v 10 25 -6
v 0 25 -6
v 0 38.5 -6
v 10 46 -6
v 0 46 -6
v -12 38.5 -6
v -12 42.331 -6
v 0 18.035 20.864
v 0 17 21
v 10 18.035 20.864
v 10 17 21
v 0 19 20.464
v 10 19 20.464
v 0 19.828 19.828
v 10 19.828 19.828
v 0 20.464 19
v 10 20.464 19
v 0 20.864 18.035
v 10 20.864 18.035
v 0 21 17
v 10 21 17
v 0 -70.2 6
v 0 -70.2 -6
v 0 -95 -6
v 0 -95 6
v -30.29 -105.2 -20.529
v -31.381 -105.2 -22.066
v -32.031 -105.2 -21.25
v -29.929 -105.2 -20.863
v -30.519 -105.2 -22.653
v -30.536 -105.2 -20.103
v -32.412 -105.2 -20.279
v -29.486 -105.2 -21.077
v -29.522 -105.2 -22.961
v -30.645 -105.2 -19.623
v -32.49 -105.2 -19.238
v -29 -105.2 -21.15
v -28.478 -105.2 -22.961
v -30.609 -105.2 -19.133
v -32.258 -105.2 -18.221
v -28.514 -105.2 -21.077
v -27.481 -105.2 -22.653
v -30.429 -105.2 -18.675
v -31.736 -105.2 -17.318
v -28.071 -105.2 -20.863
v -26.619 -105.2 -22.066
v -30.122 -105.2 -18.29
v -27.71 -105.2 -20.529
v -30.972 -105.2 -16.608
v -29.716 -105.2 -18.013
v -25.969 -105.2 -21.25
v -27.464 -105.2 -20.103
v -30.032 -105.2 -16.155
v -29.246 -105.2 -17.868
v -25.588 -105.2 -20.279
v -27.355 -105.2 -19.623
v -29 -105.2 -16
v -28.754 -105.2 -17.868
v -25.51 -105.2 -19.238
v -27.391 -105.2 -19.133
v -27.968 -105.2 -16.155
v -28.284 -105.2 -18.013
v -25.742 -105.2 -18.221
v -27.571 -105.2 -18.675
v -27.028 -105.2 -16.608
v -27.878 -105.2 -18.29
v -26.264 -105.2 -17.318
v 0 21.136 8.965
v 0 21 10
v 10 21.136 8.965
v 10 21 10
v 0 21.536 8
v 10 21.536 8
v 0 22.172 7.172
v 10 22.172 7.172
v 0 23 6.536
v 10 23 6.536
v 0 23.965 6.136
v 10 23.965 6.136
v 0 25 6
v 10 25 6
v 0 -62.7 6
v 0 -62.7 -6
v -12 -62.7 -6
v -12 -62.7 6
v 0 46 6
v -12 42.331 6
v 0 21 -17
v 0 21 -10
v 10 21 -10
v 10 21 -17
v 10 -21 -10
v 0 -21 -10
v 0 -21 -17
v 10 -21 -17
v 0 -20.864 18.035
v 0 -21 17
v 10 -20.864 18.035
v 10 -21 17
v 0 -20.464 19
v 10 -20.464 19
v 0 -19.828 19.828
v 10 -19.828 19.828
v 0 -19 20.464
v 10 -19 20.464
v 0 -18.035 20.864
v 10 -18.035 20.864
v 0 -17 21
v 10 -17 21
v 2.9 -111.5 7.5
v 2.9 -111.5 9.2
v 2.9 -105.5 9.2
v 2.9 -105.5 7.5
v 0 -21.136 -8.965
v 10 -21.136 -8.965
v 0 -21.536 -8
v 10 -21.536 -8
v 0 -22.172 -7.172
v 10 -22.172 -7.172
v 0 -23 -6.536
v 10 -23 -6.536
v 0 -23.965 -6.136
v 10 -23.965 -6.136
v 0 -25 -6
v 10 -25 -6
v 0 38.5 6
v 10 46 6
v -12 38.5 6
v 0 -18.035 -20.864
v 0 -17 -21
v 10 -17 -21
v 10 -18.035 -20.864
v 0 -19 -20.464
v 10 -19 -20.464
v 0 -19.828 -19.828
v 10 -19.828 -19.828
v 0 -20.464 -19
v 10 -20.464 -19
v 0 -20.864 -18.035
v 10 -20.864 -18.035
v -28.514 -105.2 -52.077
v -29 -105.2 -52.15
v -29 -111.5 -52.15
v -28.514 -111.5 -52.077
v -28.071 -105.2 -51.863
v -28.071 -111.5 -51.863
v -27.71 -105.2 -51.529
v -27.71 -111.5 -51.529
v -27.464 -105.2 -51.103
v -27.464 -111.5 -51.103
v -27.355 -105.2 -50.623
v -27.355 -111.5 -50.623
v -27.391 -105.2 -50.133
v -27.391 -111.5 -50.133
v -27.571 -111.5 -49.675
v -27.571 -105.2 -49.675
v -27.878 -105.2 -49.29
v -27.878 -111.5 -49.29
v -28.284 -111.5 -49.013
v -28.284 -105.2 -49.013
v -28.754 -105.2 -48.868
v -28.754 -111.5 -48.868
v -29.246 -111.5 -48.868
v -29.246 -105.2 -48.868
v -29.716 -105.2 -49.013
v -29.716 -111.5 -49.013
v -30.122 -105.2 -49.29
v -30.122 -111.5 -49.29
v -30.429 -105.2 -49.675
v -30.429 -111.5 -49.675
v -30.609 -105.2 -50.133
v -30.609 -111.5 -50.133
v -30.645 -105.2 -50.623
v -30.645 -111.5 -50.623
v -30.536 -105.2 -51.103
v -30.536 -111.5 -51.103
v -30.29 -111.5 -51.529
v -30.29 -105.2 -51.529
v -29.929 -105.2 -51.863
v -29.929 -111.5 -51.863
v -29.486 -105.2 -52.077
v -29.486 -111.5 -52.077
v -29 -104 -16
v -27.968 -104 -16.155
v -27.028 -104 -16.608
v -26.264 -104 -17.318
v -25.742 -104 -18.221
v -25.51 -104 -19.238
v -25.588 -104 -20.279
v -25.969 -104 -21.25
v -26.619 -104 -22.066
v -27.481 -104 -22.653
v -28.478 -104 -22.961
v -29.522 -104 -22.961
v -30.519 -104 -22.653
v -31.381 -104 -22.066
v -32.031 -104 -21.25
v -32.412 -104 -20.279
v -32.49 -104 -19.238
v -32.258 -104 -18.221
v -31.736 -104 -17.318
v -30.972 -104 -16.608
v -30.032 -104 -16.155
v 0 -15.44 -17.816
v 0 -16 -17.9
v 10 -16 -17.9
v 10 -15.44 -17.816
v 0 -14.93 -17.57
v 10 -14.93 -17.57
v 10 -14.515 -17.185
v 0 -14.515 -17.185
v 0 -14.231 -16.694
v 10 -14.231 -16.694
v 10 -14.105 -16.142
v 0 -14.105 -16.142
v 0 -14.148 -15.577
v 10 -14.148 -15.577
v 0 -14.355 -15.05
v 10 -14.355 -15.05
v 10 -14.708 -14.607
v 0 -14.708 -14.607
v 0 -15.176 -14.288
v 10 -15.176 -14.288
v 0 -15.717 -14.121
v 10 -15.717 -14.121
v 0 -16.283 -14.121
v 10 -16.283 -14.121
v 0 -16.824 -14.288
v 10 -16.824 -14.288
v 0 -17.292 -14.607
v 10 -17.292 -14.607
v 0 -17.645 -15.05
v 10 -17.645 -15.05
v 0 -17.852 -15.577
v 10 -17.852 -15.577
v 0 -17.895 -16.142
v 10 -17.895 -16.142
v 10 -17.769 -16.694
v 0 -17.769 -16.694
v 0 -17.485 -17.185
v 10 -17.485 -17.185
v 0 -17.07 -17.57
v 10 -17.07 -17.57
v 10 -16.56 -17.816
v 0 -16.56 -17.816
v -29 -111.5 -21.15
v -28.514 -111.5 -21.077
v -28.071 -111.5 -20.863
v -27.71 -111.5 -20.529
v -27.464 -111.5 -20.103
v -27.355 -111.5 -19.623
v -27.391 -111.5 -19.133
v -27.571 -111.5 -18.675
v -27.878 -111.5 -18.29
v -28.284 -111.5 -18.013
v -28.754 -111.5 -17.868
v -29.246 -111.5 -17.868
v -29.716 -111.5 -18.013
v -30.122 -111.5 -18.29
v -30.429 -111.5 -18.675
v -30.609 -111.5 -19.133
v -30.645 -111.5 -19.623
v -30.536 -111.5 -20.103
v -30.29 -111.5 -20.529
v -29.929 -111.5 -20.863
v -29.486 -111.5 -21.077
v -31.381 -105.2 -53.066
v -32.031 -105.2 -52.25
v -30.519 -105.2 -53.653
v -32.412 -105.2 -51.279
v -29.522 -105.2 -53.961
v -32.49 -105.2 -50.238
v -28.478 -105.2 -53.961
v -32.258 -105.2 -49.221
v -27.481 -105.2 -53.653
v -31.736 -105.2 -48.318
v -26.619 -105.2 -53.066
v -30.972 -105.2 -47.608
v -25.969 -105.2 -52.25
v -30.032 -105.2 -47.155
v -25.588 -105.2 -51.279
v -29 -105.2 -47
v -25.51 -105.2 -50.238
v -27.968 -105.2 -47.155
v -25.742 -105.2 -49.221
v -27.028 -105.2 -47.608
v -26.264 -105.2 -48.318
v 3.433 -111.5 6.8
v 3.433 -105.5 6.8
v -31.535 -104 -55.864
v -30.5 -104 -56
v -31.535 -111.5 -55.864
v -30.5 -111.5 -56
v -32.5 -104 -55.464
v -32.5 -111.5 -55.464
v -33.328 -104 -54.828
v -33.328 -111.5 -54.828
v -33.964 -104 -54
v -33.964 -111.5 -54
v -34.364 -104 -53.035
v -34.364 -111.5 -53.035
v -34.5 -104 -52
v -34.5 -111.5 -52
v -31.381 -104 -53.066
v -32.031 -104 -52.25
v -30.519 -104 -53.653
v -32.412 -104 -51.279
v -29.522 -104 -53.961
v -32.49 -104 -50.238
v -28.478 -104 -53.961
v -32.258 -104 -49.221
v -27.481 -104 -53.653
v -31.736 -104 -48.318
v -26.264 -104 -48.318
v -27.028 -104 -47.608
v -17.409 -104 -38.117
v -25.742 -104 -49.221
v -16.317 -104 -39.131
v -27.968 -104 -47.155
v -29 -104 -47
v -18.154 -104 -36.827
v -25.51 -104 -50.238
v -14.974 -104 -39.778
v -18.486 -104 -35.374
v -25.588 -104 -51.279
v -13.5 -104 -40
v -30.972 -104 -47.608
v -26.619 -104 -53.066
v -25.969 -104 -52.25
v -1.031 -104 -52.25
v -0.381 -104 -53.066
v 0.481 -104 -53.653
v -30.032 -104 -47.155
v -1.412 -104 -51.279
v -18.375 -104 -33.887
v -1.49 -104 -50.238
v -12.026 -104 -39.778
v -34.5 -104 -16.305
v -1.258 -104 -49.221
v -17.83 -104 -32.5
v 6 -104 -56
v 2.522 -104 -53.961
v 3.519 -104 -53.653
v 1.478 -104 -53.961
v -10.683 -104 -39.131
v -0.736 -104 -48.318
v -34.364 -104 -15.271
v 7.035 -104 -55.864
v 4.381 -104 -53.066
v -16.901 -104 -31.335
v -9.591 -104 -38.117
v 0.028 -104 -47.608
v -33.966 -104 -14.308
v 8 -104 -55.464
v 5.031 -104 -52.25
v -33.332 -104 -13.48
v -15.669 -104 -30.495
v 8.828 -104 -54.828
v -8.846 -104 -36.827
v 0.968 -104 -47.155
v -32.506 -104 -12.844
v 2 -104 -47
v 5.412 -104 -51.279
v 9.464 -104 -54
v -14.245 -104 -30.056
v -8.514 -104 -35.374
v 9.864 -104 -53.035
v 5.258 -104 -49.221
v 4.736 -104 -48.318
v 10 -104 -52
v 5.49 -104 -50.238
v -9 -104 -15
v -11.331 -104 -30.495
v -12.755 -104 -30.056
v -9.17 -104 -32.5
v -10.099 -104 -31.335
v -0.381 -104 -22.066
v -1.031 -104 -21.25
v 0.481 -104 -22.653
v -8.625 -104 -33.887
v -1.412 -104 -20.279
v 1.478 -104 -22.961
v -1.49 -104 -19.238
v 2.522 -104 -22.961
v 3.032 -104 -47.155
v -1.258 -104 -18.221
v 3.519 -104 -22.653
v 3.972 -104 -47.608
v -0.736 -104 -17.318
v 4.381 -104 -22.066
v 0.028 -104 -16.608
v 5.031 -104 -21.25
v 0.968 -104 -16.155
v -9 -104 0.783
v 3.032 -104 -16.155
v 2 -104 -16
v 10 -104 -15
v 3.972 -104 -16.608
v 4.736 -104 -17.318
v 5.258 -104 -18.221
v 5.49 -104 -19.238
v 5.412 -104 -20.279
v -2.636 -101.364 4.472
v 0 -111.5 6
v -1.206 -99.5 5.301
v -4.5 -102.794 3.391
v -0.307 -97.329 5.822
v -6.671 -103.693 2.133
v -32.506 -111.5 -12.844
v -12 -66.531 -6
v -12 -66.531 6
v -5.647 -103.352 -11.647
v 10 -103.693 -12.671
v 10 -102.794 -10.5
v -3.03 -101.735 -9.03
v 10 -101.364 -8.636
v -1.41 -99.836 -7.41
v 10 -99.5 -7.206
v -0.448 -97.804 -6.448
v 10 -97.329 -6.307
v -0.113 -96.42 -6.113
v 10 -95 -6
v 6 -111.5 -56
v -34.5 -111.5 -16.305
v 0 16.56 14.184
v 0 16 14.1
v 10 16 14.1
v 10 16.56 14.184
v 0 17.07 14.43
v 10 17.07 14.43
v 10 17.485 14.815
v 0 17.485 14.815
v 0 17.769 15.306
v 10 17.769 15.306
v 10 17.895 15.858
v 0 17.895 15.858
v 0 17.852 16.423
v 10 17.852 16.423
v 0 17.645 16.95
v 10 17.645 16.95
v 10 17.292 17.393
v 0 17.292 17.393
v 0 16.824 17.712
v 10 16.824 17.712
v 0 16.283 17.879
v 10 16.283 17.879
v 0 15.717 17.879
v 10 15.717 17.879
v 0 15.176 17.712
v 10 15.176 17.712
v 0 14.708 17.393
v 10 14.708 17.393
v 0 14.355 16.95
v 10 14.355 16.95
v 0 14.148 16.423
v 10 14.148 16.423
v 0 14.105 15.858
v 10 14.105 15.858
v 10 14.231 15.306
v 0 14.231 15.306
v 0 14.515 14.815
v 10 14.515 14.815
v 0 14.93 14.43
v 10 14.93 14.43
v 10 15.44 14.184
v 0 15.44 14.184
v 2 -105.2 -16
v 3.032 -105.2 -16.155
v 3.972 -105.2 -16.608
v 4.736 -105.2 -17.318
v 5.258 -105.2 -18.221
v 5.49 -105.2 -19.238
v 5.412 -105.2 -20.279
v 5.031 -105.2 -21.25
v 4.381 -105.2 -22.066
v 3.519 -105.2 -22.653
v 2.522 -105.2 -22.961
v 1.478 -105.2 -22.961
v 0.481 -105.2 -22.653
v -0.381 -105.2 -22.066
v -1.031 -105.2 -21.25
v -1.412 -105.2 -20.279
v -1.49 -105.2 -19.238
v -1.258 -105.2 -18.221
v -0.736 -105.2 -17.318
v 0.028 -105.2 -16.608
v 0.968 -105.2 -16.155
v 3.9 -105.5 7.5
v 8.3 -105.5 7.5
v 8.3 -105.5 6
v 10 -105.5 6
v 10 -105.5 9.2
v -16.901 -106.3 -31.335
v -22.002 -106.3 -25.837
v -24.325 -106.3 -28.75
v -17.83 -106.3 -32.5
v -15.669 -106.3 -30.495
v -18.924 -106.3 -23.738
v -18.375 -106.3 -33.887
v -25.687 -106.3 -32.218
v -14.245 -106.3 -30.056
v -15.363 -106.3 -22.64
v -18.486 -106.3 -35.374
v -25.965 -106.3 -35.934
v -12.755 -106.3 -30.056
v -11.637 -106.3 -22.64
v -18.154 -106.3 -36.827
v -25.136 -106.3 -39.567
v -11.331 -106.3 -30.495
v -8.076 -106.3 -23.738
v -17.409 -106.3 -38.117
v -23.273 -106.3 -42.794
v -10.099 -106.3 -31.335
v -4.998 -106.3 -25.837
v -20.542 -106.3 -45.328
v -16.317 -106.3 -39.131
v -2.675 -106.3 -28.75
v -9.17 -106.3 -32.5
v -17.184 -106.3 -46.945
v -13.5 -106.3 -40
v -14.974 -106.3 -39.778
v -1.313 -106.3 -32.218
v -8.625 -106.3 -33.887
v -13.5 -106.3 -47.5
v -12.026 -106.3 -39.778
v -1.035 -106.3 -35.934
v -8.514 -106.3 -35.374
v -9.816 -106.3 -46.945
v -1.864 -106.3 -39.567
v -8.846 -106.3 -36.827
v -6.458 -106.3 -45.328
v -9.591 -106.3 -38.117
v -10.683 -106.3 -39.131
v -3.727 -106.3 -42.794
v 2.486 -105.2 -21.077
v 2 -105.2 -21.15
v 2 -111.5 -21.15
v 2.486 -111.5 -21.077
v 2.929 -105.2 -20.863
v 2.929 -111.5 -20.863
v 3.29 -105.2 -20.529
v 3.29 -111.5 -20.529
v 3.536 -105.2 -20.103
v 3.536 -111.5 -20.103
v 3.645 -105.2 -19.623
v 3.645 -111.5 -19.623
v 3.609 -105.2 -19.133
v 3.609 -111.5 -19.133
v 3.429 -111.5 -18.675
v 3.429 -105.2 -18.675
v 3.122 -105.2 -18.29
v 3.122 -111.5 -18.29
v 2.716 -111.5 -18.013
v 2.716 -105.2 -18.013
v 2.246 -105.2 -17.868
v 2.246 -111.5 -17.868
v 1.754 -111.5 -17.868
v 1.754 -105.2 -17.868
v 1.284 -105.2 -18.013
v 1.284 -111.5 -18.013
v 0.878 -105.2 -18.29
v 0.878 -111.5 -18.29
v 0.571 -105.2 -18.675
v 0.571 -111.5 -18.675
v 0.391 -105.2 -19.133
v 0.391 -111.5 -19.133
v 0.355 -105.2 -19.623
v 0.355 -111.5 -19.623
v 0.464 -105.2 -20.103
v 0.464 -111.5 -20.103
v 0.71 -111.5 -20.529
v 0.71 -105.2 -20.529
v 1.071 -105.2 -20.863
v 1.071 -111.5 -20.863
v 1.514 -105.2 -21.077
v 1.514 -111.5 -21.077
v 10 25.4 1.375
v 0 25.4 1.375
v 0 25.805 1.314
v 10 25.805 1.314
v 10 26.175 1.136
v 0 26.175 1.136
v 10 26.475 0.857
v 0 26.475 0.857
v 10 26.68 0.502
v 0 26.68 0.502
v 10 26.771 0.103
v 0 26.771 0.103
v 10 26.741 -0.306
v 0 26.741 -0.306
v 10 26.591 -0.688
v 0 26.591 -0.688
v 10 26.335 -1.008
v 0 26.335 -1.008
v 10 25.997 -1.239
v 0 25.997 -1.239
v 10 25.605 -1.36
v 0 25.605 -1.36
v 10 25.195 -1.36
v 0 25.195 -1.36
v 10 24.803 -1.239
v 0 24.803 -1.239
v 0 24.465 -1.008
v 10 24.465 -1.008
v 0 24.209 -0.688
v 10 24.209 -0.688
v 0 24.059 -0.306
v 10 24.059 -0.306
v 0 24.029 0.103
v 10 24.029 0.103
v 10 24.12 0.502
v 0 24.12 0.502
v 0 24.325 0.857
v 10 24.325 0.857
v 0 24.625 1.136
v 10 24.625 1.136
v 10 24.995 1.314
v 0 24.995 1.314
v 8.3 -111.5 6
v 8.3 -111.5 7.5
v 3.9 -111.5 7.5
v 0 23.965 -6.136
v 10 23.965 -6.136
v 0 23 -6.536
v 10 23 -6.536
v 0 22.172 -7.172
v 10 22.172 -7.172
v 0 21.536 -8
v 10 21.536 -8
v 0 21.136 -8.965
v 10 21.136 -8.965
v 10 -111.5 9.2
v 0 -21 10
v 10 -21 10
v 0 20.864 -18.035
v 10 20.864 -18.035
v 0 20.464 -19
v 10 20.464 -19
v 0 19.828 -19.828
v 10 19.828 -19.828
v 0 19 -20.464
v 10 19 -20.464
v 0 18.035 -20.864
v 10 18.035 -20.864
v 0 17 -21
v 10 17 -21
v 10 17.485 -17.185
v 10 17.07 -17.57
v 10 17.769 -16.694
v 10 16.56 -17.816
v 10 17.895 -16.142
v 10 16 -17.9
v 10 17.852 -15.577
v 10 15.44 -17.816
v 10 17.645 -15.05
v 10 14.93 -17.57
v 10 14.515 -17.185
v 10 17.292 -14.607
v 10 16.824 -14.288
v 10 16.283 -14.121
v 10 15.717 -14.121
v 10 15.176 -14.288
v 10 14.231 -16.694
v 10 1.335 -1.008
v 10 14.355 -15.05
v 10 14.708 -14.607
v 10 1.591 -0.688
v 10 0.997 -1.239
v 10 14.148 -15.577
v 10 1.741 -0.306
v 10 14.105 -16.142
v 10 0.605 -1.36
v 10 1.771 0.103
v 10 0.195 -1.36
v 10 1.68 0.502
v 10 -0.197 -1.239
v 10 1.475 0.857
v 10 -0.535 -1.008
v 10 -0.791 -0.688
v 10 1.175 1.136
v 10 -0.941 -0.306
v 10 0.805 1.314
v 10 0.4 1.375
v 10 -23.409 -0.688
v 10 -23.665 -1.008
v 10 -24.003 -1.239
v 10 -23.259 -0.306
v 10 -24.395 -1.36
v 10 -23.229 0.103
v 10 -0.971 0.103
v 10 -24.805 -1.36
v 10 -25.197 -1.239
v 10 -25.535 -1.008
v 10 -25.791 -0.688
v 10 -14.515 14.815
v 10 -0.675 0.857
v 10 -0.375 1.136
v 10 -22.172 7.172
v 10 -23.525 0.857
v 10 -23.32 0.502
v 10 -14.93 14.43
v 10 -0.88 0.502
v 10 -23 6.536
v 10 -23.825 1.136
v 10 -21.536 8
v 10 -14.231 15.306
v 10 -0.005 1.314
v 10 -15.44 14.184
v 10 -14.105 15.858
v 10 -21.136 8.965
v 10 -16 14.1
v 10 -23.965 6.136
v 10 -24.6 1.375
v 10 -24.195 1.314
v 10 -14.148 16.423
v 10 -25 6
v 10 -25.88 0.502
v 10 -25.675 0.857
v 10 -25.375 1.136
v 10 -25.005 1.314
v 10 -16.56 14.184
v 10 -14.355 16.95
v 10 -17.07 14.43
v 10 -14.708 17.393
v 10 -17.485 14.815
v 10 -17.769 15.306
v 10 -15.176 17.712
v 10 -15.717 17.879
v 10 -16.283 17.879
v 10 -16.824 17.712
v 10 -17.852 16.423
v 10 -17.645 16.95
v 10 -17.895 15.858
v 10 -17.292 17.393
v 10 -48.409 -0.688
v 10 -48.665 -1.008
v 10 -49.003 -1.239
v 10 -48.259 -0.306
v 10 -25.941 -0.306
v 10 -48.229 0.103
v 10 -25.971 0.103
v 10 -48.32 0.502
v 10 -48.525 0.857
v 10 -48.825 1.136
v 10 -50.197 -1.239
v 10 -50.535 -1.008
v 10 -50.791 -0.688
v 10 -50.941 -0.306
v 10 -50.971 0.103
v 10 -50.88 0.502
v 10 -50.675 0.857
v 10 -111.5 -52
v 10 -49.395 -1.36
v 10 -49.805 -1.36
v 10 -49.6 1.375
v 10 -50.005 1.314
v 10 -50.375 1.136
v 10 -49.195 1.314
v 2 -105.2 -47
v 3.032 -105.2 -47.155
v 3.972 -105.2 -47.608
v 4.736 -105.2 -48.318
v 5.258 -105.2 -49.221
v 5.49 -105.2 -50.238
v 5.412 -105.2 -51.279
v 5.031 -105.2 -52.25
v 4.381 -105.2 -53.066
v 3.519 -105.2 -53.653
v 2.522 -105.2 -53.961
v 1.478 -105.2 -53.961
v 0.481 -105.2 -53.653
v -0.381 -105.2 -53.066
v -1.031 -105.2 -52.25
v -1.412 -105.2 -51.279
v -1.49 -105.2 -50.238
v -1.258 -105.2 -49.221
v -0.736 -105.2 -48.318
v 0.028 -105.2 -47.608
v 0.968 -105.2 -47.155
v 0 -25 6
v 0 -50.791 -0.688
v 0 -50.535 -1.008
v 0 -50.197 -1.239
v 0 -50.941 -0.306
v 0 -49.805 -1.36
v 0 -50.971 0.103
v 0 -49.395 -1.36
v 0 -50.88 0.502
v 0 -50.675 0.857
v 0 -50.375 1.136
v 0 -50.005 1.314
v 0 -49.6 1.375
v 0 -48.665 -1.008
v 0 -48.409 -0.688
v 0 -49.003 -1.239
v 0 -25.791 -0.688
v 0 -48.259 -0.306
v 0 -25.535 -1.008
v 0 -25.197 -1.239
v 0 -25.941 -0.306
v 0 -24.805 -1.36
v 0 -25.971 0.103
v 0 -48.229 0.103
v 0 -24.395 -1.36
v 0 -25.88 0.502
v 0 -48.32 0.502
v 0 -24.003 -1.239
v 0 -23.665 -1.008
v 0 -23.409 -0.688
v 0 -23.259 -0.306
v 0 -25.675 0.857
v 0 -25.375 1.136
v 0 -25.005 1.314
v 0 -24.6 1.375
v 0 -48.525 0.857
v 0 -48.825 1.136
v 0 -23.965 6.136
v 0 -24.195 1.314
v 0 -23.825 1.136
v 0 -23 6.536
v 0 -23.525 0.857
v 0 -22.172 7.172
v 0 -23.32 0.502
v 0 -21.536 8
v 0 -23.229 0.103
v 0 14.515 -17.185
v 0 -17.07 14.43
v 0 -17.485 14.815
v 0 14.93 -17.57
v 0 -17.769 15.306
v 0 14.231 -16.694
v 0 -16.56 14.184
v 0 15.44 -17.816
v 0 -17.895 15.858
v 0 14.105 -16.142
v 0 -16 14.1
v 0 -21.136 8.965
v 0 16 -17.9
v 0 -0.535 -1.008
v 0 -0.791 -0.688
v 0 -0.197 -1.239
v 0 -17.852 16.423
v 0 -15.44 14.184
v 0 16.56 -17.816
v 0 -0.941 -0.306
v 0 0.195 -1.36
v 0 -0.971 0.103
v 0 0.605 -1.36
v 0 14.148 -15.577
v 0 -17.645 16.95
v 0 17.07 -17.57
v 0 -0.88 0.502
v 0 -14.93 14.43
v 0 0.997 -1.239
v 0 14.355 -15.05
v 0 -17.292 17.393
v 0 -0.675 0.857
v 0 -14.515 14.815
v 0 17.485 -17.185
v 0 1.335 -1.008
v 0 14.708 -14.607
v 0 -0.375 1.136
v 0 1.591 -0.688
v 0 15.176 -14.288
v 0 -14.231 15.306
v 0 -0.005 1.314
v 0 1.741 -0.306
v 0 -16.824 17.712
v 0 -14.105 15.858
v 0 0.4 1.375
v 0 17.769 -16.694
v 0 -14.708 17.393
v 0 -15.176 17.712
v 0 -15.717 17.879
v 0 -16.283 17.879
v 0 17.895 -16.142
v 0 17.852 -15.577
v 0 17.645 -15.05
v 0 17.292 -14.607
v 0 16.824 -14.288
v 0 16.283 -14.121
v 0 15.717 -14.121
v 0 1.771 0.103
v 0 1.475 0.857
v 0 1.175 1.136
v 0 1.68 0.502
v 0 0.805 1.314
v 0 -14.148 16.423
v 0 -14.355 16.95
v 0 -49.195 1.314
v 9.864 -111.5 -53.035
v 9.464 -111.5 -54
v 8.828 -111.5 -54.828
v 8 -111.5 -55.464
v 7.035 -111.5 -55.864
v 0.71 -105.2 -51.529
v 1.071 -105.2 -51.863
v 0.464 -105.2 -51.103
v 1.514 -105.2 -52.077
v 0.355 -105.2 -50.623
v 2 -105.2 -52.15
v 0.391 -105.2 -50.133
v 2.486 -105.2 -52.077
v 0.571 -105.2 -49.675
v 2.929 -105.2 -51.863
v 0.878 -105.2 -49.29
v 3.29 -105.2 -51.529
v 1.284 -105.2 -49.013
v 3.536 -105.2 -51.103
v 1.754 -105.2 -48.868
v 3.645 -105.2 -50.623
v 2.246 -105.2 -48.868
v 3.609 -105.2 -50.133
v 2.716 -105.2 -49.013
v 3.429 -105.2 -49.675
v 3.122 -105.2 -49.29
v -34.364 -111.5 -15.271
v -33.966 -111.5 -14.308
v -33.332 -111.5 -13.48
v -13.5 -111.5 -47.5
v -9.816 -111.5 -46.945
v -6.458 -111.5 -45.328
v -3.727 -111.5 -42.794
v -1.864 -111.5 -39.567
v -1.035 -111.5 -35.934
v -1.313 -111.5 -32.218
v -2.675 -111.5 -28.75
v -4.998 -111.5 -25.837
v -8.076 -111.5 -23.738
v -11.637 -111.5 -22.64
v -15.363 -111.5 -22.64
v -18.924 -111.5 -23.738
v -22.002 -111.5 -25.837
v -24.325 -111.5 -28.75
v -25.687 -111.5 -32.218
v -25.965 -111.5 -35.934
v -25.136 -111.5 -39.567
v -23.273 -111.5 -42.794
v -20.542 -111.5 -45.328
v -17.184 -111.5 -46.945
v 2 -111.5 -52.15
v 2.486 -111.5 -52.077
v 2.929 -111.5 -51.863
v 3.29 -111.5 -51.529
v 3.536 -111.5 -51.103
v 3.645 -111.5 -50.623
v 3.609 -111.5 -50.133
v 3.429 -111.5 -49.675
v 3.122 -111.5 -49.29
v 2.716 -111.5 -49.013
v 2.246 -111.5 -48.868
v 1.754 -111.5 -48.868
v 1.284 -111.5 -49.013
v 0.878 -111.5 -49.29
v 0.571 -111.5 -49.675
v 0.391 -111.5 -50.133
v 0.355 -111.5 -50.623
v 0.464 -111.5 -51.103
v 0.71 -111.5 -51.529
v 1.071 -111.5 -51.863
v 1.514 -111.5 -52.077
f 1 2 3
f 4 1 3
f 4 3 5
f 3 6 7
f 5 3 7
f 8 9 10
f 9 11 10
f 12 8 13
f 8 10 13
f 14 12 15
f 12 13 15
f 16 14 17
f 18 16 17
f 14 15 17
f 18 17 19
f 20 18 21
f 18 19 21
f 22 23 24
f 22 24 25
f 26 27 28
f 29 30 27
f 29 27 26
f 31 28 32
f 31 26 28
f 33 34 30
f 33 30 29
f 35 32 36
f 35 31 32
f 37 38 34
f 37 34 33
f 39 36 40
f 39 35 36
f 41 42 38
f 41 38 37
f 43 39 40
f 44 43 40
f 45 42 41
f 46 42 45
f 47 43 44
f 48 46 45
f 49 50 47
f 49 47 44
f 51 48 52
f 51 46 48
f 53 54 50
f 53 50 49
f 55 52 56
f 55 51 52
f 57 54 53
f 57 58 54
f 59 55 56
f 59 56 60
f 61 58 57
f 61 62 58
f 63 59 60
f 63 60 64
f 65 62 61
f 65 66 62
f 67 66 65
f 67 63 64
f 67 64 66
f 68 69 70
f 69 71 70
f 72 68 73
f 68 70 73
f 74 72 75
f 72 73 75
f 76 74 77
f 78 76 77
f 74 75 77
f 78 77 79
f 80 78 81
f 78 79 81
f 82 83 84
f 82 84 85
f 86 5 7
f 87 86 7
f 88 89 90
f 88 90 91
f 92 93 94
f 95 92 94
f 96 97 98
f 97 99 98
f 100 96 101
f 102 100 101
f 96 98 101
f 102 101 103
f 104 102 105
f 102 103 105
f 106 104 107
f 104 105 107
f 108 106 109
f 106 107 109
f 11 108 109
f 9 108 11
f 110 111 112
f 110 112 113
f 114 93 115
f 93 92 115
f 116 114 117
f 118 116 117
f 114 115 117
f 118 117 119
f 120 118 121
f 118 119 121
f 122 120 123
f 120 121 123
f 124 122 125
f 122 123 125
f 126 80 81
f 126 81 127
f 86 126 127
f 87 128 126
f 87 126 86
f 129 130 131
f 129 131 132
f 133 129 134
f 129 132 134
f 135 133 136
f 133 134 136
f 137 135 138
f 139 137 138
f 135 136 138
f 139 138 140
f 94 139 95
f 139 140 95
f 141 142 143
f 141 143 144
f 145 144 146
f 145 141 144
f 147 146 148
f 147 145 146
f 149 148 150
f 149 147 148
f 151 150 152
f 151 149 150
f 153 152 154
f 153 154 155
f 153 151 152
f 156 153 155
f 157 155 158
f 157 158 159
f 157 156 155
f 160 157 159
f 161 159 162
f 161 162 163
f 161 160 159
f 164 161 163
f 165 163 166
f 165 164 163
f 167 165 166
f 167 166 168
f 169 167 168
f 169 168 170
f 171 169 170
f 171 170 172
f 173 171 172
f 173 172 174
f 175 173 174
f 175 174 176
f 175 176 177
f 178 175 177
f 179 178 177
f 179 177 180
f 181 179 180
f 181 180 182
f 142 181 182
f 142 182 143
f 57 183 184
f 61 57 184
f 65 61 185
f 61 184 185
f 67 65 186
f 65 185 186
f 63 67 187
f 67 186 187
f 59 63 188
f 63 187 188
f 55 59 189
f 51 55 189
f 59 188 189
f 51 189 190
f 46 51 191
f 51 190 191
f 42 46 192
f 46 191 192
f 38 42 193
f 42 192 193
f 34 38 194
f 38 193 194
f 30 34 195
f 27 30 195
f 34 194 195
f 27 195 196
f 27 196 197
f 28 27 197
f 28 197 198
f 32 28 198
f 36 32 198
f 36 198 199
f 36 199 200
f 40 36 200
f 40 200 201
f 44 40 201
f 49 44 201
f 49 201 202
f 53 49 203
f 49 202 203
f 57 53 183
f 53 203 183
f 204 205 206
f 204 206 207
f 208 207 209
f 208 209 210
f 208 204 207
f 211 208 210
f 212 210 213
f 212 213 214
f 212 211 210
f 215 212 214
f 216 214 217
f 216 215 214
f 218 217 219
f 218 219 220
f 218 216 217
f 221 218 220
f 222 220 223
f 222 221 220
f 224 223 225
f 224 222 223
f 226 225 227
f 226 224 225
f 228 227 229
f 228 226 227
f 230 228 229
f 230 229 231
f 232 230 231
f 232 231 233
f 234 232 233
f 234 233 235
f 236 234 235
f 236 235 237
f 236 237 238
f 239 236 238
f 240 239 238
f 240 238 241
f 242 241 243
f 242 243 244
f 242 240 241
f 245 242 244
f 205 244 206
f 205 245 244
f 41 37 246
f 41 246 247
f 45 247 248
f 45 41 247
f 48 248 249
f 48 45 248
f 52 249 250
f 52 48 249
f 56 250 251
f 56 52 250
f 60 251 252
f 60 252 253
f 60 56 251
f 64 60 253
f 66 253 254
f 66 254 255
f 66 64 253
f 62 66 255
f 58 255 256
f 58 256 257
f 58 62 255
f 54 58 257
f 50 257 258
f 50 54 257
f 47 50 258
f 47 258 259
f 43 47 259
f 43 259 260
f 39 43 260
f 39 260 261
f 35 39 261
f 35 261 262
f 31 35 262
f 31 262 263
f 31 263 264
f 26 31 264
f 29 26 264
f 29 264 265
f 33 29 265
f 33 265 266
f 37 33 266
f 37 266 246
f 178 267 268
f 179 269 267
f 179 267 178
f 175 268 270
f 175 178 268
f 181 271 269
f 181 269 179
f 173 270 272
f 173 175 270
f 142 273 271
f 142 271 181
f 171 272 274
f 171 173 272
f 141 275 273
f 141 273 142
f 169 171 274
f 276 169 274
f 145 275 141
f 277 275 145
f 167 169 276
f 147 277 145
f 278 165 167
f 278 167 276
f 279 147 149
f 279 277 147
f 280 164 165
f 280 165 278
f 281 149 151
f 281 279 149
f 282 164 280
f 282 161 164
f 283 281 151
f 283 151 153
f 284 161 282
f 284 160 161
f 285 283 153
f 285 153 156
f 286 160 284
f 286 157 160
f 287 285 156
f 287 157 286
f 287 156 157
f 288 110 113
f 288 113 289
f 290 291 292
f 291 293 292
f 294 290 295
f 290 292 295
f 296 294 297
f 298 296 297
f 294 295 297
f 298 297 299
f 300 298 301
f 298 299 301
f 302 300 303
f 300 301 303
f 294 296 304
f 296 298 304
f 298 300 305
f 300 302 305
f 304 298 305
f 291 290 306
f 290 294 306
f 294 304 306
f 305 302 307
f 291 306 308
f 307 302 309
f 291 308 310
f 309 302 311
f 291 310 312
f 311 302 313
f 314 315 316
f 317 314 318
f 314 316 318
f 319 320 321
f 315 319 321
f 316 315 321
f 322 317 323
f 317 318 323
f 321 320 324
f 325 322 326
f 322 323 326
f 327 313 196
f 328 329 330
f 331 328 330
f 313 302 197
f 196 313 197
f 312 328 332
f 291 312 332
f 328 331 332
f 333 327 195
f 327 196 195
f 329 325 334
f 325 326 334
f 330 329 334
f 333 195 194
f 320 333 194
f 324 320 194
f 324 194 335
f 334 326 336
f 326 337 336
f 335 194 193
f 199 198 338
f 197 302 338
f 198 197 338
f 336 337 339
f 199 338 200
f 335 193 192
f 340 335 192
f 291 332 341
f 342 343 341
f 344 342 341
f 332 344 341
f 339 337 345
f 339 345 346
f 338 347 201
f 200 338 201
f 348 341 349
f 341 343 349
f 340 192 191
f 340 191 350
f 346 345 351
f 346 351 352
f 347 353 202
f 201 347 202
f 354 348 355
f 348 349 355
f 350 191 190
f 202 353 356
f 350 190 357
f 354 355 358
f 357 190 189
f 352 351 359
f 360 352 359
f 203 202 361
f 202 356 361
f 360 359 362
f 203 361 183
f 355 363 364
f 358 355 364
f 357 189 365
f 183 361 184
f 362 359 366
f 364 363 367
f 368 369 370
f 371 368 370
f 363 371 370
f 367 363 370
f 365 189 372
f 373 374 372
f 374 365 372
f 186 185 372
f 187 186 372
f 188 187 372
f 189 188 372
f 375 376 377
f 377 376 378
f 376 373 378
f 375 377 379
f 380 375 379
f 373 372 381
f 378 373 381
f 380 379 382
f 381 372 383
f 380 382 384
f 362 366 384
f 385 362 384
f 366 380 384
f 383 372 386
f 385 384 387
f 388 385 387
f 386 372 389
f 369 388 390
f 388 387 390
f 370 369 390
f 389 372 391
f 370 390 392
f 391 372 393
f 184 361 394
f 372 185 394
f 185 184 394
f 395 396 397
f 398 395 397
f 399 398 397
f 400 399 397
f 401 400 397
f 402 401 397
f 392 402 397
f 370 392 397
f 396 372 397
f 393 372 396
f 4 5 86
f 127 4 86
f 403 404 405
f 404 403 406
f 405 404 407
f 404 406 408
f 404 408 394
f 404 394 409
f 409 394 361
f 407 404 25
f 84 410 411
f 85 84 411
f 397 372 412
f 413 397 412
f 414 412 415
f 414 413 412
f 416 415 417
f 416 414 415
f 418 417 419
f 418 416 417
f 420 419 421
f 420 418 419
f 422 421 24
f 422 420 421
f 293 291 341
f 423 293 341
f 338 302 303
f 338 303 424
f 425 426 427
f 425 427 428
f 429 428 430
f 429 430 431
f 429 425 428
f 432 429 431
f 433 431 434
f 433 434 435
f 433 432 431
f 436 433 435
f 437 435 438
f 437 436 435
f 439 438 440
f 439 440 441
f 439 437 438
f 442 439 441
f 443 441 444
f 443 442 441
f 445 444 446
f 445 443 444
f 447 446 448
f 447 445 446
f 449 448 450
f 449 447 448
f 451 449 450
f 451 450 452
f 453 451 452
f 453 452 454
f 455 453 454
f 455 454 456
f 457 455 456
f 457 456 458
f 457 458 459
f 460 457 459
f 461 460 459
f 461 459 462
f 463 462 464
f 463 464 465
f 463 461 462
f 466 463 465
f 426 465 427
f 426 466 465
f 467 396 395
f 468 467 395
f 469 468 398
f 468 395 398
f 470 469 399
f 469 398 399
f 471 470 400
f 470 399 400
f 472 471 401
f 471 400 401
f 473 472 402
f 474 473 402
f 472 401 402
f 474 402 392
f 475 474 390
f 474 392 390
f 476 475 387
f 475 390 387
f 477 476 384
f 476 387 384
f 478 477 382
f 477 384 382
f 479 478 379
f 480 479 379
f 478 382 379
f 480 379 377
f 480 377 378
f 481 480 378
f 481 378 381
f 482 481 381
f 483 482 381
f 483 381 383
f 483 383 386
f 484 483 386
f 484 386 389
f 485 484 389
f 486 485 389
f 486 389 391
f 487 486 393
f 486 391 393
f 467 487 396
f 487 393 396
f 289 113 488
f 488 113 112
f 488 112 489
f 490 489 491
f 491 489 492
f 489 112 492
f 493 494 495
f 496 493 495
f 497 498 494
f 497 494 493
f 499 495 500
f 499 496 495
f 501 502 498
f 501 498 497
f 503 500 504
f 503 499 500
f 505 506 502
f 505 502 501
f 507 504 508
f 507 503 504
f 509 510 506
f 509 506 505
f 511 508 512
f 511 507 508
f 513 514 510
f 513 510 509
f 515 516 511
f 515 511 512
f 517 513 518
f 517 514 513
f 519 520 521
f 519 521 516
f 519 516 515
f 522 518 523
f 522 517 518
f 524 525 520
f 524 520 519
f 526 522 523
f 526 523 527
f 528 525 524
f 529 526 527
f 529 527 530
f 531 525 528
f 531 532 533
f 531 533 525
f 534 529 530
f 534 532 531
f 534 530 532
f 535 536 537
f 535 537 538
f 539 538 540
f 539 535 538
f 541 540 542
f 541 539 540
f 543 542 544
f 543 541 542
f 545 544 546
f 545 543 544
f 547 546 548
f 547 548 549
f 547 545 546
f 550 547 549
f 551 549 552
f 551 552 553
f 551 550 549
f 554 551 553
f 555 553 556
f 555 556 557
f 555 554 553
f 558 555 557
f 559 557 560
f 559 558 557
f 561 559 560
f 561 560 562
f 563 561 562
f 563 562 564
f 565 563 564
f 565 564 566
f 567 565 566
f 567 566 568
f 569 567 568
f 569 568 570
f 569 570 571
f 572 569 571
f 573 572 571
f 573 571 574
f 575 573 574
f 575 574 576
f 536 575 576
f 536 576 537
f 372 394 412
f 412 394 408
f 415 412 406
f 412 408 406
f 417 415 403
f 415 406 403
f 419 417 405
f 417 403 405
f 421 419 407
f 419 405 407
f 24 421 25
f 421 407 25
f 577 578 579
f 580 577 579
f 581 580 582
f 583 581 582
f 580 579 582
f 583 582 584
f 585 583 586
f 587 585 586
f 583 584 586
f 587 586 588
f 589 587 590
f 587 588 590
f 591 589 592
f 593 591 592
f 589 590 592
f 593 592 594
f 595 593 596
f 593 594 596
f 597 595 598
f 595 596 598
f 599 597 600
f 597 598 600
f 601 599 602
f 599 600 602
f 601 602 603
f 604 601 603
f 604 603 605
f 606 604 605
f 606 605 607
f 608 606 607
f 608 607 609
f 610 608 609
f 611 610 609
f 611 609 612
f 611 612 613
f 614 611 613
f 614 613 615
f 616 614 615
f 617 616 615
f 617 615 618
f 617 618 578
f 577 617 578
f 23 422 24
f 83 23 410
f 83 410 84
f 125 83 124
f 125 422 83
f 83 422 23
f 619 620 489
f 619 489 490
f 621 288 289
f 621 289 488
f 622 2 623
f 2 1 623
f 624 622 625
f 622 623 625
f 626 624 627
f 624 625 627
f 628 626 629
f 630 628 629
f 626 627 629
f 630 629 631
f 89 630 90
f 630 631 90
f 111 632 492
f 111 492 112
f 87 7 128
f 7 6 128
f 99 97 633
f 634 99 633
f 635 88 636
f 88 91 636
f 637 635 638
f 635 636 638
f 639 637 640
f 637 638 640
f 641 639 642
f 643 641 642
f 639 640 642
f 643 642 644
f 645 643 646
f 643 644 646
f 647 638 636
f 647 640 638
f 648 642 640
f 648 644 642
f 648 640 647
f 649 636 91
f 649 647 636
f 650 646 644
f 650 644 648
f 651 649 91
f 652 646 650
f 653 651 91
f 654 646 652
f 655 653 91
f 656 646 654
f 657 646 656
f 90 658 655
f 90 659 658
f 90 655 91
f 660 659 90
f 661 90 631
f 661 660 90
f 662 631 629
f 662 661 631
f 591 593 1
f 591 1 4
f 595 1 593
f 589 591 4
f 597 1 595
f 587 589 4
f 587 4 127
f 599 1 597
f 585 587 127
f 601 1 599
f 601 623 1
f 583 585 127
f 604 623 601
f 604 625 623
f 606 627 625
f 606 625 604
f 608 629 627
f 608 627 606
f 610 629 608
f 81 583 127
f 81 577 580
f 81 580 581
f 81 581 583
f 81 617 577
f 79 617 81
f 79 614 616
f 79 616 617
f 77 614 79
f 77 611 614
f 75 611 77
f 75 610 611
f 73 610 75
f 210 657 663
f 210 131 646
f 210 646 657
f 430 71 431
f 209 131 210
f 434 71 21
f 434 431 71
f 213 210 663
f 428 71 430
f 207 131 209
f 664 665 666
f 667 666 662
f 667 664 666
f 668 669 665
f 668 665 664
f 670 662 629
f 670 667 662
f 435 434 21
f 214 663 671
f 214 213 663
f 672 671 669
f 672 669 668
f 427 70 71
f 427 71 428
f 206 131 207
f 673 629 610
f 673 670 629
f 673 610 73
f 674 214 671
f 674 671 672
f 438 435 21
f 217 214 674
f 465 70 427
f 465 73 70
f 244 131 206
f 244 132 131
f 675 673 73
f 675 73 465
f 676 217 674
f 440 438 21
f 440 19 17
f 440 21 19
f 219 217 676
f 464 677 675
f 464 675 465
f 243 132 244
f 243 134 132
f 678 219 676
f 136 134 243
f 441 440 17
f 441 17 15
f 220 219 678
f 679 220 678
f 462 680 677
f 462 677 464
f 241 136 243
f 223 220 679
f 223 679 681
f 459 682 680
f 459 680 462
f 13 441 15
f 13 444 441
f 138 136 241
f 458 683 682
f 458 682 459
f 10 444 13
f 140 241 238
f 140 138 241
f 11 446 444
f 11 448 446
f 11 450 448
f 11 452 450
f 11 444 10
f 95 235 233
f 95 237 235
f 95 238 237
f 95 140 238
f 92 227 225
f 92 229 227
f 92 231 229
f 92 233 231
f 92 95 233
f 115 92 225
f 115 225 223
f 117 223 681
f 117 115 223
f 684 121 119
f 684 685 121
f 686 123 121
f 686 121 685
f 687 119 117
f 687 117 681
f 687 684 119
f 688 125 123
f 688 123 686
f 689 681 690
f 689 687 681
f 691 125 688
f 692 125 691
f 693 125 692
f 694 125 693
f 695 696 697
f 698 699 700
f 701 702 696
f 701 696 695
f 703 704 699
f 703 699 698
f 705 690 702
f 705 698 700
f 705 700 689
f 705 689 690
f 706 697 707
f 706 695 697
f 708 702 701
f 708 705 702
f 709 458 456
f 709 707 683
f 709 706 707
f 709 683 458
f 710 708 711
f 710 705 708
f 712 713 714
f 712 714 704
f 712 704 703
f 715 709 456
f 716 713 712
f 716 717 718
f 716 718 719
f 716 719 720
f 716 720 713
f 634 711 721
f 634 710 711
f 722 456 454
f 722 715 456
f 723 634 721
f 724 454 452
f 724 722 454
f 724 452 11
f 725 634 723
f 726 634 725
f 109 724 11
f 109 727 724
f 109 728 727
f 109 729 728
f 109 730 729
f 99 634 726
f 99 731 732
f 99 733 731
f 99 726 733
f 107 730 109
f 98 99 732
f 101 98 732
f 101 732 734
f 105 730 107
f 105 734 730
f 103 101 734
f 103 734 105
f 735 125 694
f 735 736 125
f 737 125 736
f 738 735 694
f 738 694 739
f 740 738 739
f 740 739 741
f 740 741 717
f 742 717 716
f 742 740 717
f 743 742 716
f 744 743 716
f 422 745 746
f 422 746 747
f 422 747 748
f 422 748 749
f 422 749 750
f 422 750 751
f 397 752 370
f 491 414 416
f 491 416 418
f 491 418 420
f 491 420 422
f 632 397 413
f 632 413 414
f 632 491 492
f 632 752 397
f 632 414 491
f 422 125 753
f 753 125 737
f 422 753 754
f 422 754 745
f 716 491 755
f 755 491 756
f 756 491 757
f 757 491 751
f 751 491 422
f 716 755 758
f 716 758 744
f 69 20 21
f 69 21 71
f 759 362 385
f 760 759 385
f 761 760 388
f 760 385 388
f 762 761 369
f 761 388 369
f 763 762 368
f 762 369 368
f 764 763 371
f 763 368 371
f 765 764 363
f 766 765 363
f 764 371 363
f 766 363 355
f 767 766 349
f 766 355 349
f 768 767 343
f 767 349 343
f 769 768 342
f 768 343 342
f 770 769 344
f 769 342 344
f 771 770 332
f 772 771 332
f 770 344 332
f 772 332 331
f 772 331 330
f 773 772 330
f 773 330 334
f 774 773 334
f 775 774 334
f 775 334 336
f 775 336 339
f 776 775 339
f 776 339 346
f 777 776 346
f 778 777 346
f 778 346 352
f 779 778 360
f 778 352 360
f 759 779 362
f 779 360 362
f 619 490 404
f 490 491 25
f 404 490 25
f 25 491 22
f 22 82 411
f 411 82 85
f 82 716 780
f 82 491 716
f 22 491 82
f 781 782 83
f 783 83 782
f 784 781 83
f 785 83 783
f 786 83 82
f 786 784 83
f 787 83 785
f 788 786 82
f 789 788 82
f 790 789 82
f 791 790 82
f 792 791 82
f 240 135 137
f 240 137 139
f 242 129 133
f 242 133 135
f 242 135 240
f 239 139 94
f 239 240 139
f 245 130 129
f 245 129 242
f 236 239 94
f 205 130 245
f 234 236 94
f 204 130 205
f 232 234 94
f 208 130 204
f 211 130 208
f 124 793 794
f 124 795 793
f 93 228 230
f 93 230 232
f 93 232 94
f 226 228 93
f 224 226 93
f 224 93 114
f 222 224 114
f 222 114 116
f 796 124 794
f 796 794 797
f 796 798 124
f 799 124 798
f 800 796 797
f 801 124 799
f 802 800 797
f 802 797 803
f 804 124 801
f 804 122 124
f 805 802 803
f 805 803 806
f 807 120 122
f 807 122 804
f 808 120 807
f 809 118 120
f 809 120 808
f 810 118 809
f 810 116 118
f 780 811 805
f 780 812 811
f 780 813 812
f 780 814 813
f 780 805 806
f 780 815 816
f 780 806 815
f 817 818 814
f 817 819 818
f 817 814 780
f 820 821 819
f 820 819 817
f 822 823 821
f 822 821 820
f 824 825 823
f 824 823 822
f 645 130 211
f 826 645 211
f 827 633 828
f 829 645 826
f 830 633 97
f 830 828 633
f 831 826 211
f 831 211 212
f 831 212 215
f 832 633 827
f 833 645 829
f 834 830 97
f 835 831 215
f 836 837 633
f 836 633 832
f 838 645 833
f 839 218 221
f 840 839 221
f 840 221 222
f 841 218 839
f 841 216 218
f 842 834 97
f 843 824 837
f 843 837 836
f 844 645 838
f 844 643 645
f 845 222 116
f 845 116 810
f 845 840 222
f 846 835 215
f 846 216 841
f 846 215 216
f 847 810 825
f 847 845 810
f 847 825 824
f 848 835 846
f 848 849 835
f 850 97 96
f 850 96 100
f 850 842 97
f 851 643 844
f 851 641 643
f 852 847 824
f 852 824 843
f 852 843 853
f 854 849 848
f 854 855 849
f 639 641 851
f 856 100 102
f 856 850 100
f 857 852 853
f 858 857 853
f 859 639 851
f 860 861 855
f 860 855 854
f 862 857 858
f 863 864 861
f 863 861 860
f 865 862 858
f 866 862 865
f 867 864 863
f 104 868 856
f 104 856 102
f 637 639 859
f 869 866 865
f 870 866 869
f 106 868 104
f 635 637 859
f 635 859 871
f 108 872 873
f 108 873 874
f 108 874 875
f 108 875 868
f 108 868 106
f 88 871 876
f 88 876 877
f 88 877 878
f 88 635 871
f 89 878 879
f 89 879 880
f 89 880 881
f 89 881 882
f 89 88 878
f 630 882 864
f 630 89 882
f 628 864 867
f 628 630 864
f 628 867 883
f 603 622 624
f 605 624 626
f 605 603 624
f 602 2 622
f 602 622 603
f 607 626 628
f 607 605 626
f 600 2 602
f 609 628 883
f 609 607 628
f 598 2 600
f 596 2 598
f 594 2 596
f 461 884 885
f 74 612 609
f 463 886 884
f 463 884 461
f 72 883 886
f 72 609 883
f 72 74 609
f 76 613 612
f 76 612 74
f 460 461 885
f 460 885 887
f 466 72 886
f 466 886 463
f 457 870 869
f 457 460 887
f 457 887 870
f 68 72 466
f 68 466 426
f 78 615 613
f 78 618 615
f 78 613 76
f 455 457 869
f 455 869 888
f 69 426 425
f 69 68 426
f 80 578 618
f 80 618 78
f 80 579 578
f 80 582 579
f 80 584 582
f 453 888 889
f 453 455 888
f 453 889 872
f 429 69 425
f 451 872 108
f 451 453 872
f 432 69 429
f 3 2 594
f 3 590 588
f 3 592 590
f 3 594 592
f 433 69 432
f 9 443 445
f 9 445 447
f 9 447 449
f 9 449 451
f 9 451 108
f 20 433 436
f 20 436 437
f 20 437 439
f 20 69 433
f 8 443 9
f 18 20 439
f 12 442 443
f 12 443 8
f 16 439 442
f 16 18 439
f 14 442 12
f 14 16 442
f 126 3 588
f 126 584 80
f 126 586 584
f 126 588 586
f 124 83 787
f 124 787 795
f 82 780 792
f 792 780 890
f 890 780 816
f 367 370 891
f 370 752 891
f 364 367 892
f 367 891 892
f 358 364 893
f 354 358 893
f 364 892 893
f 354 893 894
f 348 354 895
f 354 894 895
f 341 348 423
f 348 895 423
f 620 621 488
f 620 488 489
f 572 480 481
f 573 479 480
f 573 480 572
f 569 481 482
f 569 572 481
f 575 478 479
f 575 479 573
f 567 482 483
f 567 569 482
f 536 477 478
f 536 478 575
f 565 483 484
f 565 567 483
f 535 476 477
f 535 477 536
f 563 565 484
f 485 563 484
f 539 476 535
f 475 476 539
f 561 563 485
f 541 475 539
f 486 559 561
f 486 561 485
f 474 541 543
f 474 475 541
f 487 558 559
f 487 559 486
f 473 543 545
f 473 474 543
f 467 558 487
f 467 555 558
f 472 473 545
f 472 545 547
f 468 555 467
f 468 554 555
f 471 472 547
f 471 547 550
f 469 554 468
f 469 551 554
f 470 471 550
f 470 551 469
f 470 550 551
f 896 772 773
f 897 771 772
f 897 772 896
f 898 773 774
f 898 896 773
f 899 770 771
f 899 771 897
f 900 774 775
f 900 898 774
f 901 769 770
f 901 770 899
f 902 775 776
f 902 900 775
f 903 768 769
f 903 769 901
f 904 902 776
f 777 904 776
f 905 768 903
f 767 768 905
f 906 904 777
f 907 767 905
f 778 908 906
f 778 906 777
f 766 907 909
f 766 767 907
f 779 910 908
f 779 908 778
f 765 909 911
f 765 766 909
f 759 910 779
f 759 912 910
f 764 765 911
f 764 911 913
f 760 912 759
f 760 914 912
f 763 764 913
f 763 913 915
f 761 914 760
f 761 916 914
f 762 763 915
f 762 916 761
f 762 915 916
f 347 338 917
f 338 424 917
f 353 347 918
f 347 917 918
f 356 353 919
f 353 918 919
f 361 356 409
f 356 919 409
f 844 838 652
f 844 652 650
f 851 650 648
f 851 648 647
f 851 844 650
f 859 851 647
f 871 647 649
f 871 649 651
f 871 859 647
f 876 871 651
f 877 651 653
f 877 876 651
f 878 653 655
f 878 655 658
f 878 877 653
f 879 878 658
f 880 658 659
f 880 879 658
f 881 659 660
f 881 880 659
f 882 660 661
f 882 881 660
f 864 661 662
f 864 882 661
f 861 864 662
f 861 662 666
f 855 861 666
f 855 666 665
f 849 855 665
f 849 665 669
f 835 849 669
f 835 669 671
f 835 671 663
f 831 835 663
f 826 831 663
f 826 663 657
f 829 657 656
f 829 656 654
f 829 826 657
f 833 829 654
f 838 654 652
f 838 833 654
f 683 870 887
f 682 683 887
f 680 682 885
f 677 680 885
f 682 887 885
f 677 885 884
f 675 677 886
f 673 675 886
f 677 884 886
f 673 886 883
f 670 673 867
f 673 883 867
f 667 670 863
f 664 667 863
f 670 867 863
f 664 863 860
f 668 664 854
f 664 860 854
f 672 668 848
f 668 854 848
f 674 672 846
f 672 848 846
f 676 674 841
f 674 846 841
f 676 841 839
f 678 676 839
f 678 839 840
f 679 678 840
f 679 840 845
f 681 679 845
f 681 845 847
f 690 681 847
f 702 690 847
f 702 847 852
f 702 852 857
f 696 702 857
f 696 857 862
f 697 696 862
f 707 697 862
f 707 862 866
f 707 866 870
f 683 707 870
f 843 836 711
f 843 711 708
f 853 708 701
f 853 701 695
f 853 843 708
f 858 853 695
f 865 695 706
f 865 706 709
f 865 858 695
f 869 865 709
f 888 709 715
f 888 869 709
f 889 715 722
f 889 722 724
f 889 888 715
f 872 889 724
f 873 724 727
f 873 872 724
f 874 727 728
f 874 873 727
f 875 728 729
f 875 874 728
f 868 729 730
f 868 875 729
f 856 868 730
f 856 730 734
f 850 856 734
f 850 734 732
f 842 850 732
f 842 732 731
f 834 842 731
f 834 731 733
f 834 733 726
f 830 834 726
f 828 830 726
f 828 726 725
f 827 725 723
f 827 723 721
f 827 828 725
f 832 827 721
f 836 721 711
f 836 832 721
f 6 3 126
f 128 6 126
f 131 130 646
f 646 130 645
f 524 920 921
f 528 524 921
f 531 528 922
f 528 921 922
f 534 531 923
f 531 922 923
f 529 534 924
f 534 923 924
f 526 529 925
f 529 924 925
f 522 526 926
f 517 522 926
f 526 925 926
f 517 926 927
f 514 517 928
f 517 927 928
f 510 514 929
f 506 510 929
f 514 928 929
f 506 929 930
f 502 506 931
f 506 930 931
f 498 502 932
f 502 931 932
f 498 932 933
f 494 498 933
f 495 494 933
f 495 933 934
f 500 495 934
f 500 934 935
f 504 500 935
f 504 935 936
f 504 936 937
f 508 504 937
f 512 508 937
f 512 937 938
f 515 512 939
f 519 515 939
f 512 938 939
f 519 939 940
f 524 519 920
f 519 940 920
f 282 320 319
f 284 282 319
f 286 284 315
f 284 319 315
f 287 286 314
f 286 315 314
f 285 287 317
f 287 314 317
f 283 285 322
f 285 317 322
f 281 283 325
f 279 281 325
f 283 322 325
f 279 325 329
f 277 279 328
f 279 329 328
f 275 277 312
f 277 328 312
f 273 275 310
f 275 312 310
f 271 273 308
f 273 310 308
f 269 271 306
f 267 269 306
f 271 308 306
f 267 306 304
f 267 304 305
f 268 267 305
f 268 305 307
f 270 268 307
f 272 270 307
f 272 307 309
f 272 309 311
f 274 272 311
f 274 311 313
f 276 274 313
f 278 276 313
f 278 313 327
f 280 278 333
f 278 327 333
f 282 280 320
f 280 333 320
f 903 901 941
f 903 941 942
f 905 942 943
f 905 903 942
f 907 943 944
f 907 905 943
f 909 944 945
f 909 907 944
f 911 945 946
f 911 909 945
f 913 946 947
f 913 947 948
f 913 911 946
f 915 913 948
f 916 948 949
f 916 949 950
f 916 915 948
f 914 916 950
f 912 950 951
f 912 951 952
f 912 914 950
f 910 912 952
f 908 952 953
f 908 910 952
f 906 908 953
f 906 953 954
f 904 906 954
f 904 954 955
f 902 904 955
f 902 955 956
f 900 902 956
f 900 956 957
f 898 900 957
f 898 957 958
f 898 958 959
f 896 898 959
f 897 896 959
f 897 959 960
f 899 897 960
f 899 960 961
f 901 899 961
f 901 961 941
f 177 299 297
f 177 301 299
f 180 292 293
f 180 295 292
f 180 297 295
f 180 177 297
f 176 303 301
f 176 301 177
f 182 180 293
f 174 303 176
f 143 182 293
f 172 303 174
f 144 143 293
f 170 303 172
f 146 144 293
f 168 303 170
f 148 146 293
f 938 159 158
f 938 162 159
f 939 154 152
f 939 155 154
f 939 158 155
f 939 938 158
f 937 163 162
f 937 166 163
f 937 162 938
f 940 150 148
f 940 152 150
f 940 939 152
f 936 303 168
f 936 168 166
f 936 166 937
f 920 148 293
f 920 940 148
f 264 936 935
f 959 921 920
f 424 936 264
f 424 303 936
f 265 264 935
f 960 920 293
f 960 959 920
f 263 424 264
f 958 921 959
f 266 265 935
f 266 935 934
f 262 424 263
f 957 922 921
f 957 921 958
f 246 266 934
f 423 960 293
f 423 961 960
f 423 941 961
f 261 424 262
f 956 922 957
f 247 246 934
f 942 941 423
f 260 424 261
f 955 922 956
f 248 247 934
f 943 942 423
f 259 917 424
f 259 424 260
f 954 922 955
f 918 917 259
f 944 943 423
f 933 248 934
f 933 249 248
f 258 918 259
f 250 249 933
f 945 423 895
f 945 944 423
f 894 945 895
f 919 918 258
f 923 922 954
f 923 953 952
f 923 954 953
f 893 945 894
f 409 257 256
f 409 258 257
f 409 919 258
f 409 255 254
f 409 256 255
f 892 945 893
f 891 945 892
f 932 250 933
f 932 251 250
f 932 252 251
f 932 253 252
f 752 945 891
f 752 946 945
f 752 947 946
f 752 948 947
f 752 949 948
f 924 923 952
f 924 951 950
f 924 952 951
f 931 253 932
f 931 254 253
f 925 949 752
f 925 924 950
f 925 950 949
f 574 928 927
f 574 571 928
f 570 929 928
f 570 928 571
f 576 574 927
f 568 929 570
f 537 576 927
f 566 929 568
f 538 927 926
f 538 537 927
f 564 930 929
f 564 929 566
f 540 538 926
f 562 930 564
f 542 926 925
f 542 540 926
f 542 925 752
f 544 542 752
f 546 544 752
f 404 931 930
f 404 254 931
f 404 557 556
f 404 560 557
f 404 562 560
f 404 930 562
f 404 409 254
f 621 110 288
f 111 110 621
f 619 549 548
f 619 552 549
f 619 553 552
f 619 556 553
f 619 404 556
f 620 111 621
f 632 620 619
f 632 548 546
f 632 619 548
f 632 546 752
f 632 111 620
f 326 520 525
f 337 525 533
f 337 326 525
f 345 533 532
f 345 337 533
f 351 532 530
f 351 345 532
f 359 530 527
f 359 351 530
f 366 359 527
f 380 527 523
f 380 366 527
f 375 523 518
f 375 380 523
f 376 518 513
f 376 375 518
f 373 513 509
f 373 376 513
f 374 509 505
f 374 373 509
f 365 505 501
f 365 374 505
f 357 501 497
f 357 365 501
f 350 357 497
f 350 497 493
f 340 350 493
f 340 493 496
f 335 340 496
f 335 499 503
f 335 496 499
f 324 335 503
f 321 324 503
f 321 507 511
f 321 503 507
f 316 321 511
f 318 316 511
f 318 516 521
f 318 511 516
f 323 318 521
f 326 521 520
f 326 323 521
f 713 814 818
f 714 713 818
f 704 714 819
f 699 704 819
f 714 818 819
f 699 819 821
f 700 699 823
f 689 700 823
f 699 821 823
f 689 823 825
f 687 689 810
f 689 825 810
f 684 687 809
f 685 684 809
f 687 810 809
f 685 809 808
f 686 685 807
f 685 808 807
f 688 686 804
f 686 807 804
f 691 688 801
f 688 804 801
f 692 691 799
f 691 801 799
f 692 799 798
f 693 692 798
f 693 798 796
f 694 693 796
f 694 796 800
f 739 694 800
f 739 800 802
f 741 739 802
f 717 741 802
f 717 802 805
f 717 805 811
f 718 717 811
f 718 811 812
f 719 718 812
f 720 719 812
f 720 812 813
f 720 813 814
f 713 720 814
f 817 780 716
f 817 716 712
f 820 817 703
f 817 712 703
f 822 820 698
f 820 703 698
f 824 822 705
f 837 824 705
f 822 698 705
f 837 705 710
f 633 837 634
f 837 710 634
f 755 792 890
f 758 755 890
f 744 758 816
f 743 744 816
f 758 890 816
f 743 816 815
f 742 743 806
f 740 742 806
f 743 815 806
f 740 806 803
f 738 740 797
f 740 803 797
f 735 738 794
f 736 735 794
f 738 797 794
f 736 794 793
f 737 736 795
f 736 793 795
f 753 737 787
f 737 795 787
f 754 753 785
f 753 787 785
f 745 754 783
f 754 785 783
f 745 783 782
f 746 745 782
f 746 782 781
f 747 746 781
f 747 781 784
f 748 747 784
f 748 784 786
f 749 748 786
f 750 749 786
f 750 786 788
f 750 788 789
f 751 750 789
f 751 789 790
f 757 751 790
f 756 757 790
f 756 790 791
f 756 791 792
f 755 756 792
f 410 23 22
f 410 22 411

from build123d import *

# Parameters (mm, degrees)
SKETCH1_W           = 42
SKETCH1_H           = 42
SKETCH1_R           = 1.9
BOSS_EXTRUDE1_DEPTH = 10
SKETCH2_W           = 12
SKETCH2_H           = 150
BOSS_EXTRUDE2_DEPTH = 10
SKETCH3_W           = 12
SKETCH3_H           = 3.75
BOSS_EXTRUDE3_DEPTH = 12
CHAMFER1_SIZE       = 3.75
CHAMFER1_SIZE_2     = 12.265697319
SKETCH4_R           = 1.375
CUT_EXTRUDE1_DEPTH  = 12
SKETCH5_W           = 42
SKETCH5_H           = 42
SKETCH5_R           = 1.65
SKETCH5_R_2         = 5
BOSS_EXTRUDE4_DEPTH = 7.5
SKETCH6_R           = 12.5
CUT_EXTRUDE2_DEPTH  = 5.2
FILLET1_R           = 4
FILLET2_R           = 9
SKETCH8_R           = 3.5
CUT_EXTRUDE4_DEPTH  = 1.2
BOSS_EXTRUDE7_DEPTH = 6


with BuildPart() as part:
    # Sketch1 → Boss-Extrude1 (new body)
    with BuildSketch(Plane(origin=(0, 0, 0), x_dir=(0, 0, -1), z_dir=(1, 0, 0))):
        Rectangle(SKETCH1_W, SKETCH1_H)
        with Locations((16, -16)):
            Circle(SKETCH1_R, mode=Mode.SUBTRACT)
        with Locations((-16, -16)):
            Circle(SKETCH1_R, mode=Mode.SUBTRACT)
        with Locations((-16, 16)):
            Circle(SKETCH1_R, mode=Mode.SUBTRACT)
        with Locations((16, 16)):
            Circle(SKETCH1_R, mode=Mode.SUBTRACT)
    extrude(amount=BOSS_EXTRUDE1_DEPTH)

    # Sketch2 → Boss-Extrude2 (add)
    with BuildSketch(Plane.ZY):
        with Locations((0, -29)):
            Rectangle(SKETCH2_W, SKETCH2_H)
    extrude(amount=-BOSS_EXTRUDE2_DEPTH)

    # Sketch3 → Boss-Extrude3 (add)
    with BuildSketch(Plane.ZY):
        with Locations((0, 40.375)):
            Rectangle(SKETCH3_W, SKETCH3_H)
        with Locations((0, -64.575)):
            Rectangle(SKETCH3_W, SKETCH3_H)
    extrude(amount=BOSS_EXTRUDE3_DEPTH)

    # Chamfer1
    # the kernel refuses this chamfer: 12.265697319, 3.75 mm, written as the material it adds along each edge
    with BuildSketch(Plane(origin=(0, 42.25, -6), x_dir=(0.11964200288050787, 0.9928170985366542, 0), z_dir=(0, 0, 1))) as chamfer1_piece_1_section:
        Polygon((CHAMFER1_SIZE * 0.992817098537, CHAMFER1_SIZE * 0.119642002881), (-CHAMFER1_SIZE_2 * 0.119642002884, CHAMFER1_SIZE_2 * 0.992817098562), (0, 0), align=None)
    chamfer1_piece_1 = extrude(amount=12, mode=Mode.PRIVATE)
    chamfer1_piece_1 = split(chamfer1_piece_1, bisect_by=Plane(origin=(-4.172539525, 46, 0), z_dir=(0, -1, 0)), keep=Keep.TOP, mode=Mode.PRIVATE)
    chamfer1_piece_1 = split(chamfer1_piece_1, bisect_by=Plane(origin=(-12, 43.383581674, 0), z_dir=(1, 0, 0)), keep=Keep.TOP, mode=Mode.PRIVATE)
    add(chamfer1_piece_1)
    with BuildSketch(Plane(origin=(0, -66.45, -6), x_dir=(0.11964200288050787, -0.9928170985366542, 0), z_dir=(0, 0, 1))) as chamfer1_piece_2_section:
        Polygon((CHAMFER1_SIZE * 0.992817098537, -CHAMFER1_SIZE * 0.119642002881), (-CHAMFER1_SIZE_2 * 0.119642002884, -CHAMFER1_SIZE_2 * 0.992817098562), (0, 0), align=None)
    chamfer1_piece_2 = extrude(amount=12, mode=Mode.PRIVATE)
    chamfer1_piece_2 = split(chamfer1_piece_2, bisect_by=Plane(origin=(-12, -67.58994207, 0), z_dir=(1, 0, 0)), keep=Keep.TOP, mode=Mode.PRIVATE)
    add(chamfer1_piece_2)

    # Sketch4 → Cut-Extrude1 (cut)
    with BuildSketch(Plane.ZY):
        with Locations((0, 25.4)):
            Circle(SKETCH4_R)
        with Locations((0, 0.4)):
            Circle(SKETCH4_R)
        with Locations((0, -24.6)):
            Circle(SKETCH4_R)
        with Locations((0, -49.6)):
            Circle(SKETCH4_R)
    extrude(amount=-CUT_EXTRUDE1_DEPTH, mode=Mode.SUBTRACT)

    # Sketch5 → Boss-Extrude4 (add)
    # profile 1 of 2: a face of its own
    with BuildSketch(Plane.XZ.offset(104)):
        Polygon((10, -56), (10, 6), (0, 6), (-34.5, -14), (7.5, -14), (7.5, -56), align=None)
    # profile 2 of 2: a face of its own
    with BuildSketch(Plane.XZ.offset(104)):
        with Locations((-13.5, -35)):
            Rectangle(SKETCH5_W, SKETCH5_H)
        with Locations(Location((-29, -50.5, 0), (0, 0, 270))):
            Circle(SKETCH5_R, mode=Mode.SUBTRACT)
        with Locations(Location((-13.5, -35, 0), (0, 0, 270))):
            Circle(SKETCH5_R_2, mode=Mode.SUBTRACT)
        with Locations(Location((2, -50.5, 0), (0, 0, 270))):
            Circle(SKETCH5_R, mode=Mode.SUBTRACT)
        with Locations(Location((-29, -19.5, 0), (0, 0, 270))):
            Circle(SKETCH5_R, mode=Mode.SUBTRACT)
        with Locations(Location((2, -19.5, 0), (0, 0, 270))):
            Circle(SKETCH5_R, mode=Mode.SUBTRACT)
    extrude(amount=BOSS_EXTRUDE4_DEPTH)

    # Sketch6 → Cut-Extrude2 (cut)
    with BuildSketch(Plane.XZ.offset(111.5)):
        with Locations(Location((-13.5, -35, 0), (0, 0, 270))):
            Circle(SKETCH6_R)
    extrude(amount=-CUT_EXTRUDE2_DEPTH, mode=Mode.SUBTRACT)

    # Fillet1
    fillet1_edges = [part.edges().sort_by_distance(p)[0] for p in [
        (-34.5, -107.75, -56),
        (10, -107.75, -56),
        (-34.5, -107.75, -14),
        (5, -21, 6),
        (5, -21, -6),
        (5, 21, -6),
        (5, 21, 6),
        (5, -21, -21),
        (5, -21, 21),
        (5, 21, 21),
        (5, 21, -21),
    ]]
    fillet(fillet1_edges, radius=FILLET1_R)

    # Fillet2
    fillet2_edges = [part.edges().sort_by_distance(p)[0] for p in [
        (5, -104, -6),
        (0, -104, 0),
    ]]
    fillet(fillet2_edges, radius=FILLET2_R)

    # Sketch8 → Cut-Extrude4 (cut)
    with BuildSketch(Plane(origin=(0, -104, 0), x_dir=(1, 0, 0), z_dir=(0, 1, 0))):
        with Locations(Location((-29, 50.5, 0), (0, 0, 270))):
            Circle(SKETCH8_R)
        with Locations(Location((2, 50.5, 0), (0, 0, 270))):
            Circle(SKETCH8_R)
        with Locations(Location((2, 19.5, 0), (0, 0, 270))):
            Circle(SKETCH8_R)
        with Locations(Location((-29, 19.5, 0), (0, 0, 270))):
            Circle(SKETCH8_R)
    extrude(amount=-CUT_EXTRUDE4_DEPTH, mode=Mode.SUBTRACT)

    # Sketch11 → Boss-Extrude7 (add)
    with BuildSketch(Plane.XZ.offset(111.5)):
        Polygon((8.3, 6), (10, 6), (10, 9.2), (2.9, 9.2), (2.9, 7.5), (3.9, 7.5), (8.3, 7.5), align=None)
        Polygon((3.9, 7.5), (2.9, 7.5), (3.433368825, 6.8), align=None)
    extrude(amount=-BOSS_EXTRUDE7_DEPTH)


solid = part.part
